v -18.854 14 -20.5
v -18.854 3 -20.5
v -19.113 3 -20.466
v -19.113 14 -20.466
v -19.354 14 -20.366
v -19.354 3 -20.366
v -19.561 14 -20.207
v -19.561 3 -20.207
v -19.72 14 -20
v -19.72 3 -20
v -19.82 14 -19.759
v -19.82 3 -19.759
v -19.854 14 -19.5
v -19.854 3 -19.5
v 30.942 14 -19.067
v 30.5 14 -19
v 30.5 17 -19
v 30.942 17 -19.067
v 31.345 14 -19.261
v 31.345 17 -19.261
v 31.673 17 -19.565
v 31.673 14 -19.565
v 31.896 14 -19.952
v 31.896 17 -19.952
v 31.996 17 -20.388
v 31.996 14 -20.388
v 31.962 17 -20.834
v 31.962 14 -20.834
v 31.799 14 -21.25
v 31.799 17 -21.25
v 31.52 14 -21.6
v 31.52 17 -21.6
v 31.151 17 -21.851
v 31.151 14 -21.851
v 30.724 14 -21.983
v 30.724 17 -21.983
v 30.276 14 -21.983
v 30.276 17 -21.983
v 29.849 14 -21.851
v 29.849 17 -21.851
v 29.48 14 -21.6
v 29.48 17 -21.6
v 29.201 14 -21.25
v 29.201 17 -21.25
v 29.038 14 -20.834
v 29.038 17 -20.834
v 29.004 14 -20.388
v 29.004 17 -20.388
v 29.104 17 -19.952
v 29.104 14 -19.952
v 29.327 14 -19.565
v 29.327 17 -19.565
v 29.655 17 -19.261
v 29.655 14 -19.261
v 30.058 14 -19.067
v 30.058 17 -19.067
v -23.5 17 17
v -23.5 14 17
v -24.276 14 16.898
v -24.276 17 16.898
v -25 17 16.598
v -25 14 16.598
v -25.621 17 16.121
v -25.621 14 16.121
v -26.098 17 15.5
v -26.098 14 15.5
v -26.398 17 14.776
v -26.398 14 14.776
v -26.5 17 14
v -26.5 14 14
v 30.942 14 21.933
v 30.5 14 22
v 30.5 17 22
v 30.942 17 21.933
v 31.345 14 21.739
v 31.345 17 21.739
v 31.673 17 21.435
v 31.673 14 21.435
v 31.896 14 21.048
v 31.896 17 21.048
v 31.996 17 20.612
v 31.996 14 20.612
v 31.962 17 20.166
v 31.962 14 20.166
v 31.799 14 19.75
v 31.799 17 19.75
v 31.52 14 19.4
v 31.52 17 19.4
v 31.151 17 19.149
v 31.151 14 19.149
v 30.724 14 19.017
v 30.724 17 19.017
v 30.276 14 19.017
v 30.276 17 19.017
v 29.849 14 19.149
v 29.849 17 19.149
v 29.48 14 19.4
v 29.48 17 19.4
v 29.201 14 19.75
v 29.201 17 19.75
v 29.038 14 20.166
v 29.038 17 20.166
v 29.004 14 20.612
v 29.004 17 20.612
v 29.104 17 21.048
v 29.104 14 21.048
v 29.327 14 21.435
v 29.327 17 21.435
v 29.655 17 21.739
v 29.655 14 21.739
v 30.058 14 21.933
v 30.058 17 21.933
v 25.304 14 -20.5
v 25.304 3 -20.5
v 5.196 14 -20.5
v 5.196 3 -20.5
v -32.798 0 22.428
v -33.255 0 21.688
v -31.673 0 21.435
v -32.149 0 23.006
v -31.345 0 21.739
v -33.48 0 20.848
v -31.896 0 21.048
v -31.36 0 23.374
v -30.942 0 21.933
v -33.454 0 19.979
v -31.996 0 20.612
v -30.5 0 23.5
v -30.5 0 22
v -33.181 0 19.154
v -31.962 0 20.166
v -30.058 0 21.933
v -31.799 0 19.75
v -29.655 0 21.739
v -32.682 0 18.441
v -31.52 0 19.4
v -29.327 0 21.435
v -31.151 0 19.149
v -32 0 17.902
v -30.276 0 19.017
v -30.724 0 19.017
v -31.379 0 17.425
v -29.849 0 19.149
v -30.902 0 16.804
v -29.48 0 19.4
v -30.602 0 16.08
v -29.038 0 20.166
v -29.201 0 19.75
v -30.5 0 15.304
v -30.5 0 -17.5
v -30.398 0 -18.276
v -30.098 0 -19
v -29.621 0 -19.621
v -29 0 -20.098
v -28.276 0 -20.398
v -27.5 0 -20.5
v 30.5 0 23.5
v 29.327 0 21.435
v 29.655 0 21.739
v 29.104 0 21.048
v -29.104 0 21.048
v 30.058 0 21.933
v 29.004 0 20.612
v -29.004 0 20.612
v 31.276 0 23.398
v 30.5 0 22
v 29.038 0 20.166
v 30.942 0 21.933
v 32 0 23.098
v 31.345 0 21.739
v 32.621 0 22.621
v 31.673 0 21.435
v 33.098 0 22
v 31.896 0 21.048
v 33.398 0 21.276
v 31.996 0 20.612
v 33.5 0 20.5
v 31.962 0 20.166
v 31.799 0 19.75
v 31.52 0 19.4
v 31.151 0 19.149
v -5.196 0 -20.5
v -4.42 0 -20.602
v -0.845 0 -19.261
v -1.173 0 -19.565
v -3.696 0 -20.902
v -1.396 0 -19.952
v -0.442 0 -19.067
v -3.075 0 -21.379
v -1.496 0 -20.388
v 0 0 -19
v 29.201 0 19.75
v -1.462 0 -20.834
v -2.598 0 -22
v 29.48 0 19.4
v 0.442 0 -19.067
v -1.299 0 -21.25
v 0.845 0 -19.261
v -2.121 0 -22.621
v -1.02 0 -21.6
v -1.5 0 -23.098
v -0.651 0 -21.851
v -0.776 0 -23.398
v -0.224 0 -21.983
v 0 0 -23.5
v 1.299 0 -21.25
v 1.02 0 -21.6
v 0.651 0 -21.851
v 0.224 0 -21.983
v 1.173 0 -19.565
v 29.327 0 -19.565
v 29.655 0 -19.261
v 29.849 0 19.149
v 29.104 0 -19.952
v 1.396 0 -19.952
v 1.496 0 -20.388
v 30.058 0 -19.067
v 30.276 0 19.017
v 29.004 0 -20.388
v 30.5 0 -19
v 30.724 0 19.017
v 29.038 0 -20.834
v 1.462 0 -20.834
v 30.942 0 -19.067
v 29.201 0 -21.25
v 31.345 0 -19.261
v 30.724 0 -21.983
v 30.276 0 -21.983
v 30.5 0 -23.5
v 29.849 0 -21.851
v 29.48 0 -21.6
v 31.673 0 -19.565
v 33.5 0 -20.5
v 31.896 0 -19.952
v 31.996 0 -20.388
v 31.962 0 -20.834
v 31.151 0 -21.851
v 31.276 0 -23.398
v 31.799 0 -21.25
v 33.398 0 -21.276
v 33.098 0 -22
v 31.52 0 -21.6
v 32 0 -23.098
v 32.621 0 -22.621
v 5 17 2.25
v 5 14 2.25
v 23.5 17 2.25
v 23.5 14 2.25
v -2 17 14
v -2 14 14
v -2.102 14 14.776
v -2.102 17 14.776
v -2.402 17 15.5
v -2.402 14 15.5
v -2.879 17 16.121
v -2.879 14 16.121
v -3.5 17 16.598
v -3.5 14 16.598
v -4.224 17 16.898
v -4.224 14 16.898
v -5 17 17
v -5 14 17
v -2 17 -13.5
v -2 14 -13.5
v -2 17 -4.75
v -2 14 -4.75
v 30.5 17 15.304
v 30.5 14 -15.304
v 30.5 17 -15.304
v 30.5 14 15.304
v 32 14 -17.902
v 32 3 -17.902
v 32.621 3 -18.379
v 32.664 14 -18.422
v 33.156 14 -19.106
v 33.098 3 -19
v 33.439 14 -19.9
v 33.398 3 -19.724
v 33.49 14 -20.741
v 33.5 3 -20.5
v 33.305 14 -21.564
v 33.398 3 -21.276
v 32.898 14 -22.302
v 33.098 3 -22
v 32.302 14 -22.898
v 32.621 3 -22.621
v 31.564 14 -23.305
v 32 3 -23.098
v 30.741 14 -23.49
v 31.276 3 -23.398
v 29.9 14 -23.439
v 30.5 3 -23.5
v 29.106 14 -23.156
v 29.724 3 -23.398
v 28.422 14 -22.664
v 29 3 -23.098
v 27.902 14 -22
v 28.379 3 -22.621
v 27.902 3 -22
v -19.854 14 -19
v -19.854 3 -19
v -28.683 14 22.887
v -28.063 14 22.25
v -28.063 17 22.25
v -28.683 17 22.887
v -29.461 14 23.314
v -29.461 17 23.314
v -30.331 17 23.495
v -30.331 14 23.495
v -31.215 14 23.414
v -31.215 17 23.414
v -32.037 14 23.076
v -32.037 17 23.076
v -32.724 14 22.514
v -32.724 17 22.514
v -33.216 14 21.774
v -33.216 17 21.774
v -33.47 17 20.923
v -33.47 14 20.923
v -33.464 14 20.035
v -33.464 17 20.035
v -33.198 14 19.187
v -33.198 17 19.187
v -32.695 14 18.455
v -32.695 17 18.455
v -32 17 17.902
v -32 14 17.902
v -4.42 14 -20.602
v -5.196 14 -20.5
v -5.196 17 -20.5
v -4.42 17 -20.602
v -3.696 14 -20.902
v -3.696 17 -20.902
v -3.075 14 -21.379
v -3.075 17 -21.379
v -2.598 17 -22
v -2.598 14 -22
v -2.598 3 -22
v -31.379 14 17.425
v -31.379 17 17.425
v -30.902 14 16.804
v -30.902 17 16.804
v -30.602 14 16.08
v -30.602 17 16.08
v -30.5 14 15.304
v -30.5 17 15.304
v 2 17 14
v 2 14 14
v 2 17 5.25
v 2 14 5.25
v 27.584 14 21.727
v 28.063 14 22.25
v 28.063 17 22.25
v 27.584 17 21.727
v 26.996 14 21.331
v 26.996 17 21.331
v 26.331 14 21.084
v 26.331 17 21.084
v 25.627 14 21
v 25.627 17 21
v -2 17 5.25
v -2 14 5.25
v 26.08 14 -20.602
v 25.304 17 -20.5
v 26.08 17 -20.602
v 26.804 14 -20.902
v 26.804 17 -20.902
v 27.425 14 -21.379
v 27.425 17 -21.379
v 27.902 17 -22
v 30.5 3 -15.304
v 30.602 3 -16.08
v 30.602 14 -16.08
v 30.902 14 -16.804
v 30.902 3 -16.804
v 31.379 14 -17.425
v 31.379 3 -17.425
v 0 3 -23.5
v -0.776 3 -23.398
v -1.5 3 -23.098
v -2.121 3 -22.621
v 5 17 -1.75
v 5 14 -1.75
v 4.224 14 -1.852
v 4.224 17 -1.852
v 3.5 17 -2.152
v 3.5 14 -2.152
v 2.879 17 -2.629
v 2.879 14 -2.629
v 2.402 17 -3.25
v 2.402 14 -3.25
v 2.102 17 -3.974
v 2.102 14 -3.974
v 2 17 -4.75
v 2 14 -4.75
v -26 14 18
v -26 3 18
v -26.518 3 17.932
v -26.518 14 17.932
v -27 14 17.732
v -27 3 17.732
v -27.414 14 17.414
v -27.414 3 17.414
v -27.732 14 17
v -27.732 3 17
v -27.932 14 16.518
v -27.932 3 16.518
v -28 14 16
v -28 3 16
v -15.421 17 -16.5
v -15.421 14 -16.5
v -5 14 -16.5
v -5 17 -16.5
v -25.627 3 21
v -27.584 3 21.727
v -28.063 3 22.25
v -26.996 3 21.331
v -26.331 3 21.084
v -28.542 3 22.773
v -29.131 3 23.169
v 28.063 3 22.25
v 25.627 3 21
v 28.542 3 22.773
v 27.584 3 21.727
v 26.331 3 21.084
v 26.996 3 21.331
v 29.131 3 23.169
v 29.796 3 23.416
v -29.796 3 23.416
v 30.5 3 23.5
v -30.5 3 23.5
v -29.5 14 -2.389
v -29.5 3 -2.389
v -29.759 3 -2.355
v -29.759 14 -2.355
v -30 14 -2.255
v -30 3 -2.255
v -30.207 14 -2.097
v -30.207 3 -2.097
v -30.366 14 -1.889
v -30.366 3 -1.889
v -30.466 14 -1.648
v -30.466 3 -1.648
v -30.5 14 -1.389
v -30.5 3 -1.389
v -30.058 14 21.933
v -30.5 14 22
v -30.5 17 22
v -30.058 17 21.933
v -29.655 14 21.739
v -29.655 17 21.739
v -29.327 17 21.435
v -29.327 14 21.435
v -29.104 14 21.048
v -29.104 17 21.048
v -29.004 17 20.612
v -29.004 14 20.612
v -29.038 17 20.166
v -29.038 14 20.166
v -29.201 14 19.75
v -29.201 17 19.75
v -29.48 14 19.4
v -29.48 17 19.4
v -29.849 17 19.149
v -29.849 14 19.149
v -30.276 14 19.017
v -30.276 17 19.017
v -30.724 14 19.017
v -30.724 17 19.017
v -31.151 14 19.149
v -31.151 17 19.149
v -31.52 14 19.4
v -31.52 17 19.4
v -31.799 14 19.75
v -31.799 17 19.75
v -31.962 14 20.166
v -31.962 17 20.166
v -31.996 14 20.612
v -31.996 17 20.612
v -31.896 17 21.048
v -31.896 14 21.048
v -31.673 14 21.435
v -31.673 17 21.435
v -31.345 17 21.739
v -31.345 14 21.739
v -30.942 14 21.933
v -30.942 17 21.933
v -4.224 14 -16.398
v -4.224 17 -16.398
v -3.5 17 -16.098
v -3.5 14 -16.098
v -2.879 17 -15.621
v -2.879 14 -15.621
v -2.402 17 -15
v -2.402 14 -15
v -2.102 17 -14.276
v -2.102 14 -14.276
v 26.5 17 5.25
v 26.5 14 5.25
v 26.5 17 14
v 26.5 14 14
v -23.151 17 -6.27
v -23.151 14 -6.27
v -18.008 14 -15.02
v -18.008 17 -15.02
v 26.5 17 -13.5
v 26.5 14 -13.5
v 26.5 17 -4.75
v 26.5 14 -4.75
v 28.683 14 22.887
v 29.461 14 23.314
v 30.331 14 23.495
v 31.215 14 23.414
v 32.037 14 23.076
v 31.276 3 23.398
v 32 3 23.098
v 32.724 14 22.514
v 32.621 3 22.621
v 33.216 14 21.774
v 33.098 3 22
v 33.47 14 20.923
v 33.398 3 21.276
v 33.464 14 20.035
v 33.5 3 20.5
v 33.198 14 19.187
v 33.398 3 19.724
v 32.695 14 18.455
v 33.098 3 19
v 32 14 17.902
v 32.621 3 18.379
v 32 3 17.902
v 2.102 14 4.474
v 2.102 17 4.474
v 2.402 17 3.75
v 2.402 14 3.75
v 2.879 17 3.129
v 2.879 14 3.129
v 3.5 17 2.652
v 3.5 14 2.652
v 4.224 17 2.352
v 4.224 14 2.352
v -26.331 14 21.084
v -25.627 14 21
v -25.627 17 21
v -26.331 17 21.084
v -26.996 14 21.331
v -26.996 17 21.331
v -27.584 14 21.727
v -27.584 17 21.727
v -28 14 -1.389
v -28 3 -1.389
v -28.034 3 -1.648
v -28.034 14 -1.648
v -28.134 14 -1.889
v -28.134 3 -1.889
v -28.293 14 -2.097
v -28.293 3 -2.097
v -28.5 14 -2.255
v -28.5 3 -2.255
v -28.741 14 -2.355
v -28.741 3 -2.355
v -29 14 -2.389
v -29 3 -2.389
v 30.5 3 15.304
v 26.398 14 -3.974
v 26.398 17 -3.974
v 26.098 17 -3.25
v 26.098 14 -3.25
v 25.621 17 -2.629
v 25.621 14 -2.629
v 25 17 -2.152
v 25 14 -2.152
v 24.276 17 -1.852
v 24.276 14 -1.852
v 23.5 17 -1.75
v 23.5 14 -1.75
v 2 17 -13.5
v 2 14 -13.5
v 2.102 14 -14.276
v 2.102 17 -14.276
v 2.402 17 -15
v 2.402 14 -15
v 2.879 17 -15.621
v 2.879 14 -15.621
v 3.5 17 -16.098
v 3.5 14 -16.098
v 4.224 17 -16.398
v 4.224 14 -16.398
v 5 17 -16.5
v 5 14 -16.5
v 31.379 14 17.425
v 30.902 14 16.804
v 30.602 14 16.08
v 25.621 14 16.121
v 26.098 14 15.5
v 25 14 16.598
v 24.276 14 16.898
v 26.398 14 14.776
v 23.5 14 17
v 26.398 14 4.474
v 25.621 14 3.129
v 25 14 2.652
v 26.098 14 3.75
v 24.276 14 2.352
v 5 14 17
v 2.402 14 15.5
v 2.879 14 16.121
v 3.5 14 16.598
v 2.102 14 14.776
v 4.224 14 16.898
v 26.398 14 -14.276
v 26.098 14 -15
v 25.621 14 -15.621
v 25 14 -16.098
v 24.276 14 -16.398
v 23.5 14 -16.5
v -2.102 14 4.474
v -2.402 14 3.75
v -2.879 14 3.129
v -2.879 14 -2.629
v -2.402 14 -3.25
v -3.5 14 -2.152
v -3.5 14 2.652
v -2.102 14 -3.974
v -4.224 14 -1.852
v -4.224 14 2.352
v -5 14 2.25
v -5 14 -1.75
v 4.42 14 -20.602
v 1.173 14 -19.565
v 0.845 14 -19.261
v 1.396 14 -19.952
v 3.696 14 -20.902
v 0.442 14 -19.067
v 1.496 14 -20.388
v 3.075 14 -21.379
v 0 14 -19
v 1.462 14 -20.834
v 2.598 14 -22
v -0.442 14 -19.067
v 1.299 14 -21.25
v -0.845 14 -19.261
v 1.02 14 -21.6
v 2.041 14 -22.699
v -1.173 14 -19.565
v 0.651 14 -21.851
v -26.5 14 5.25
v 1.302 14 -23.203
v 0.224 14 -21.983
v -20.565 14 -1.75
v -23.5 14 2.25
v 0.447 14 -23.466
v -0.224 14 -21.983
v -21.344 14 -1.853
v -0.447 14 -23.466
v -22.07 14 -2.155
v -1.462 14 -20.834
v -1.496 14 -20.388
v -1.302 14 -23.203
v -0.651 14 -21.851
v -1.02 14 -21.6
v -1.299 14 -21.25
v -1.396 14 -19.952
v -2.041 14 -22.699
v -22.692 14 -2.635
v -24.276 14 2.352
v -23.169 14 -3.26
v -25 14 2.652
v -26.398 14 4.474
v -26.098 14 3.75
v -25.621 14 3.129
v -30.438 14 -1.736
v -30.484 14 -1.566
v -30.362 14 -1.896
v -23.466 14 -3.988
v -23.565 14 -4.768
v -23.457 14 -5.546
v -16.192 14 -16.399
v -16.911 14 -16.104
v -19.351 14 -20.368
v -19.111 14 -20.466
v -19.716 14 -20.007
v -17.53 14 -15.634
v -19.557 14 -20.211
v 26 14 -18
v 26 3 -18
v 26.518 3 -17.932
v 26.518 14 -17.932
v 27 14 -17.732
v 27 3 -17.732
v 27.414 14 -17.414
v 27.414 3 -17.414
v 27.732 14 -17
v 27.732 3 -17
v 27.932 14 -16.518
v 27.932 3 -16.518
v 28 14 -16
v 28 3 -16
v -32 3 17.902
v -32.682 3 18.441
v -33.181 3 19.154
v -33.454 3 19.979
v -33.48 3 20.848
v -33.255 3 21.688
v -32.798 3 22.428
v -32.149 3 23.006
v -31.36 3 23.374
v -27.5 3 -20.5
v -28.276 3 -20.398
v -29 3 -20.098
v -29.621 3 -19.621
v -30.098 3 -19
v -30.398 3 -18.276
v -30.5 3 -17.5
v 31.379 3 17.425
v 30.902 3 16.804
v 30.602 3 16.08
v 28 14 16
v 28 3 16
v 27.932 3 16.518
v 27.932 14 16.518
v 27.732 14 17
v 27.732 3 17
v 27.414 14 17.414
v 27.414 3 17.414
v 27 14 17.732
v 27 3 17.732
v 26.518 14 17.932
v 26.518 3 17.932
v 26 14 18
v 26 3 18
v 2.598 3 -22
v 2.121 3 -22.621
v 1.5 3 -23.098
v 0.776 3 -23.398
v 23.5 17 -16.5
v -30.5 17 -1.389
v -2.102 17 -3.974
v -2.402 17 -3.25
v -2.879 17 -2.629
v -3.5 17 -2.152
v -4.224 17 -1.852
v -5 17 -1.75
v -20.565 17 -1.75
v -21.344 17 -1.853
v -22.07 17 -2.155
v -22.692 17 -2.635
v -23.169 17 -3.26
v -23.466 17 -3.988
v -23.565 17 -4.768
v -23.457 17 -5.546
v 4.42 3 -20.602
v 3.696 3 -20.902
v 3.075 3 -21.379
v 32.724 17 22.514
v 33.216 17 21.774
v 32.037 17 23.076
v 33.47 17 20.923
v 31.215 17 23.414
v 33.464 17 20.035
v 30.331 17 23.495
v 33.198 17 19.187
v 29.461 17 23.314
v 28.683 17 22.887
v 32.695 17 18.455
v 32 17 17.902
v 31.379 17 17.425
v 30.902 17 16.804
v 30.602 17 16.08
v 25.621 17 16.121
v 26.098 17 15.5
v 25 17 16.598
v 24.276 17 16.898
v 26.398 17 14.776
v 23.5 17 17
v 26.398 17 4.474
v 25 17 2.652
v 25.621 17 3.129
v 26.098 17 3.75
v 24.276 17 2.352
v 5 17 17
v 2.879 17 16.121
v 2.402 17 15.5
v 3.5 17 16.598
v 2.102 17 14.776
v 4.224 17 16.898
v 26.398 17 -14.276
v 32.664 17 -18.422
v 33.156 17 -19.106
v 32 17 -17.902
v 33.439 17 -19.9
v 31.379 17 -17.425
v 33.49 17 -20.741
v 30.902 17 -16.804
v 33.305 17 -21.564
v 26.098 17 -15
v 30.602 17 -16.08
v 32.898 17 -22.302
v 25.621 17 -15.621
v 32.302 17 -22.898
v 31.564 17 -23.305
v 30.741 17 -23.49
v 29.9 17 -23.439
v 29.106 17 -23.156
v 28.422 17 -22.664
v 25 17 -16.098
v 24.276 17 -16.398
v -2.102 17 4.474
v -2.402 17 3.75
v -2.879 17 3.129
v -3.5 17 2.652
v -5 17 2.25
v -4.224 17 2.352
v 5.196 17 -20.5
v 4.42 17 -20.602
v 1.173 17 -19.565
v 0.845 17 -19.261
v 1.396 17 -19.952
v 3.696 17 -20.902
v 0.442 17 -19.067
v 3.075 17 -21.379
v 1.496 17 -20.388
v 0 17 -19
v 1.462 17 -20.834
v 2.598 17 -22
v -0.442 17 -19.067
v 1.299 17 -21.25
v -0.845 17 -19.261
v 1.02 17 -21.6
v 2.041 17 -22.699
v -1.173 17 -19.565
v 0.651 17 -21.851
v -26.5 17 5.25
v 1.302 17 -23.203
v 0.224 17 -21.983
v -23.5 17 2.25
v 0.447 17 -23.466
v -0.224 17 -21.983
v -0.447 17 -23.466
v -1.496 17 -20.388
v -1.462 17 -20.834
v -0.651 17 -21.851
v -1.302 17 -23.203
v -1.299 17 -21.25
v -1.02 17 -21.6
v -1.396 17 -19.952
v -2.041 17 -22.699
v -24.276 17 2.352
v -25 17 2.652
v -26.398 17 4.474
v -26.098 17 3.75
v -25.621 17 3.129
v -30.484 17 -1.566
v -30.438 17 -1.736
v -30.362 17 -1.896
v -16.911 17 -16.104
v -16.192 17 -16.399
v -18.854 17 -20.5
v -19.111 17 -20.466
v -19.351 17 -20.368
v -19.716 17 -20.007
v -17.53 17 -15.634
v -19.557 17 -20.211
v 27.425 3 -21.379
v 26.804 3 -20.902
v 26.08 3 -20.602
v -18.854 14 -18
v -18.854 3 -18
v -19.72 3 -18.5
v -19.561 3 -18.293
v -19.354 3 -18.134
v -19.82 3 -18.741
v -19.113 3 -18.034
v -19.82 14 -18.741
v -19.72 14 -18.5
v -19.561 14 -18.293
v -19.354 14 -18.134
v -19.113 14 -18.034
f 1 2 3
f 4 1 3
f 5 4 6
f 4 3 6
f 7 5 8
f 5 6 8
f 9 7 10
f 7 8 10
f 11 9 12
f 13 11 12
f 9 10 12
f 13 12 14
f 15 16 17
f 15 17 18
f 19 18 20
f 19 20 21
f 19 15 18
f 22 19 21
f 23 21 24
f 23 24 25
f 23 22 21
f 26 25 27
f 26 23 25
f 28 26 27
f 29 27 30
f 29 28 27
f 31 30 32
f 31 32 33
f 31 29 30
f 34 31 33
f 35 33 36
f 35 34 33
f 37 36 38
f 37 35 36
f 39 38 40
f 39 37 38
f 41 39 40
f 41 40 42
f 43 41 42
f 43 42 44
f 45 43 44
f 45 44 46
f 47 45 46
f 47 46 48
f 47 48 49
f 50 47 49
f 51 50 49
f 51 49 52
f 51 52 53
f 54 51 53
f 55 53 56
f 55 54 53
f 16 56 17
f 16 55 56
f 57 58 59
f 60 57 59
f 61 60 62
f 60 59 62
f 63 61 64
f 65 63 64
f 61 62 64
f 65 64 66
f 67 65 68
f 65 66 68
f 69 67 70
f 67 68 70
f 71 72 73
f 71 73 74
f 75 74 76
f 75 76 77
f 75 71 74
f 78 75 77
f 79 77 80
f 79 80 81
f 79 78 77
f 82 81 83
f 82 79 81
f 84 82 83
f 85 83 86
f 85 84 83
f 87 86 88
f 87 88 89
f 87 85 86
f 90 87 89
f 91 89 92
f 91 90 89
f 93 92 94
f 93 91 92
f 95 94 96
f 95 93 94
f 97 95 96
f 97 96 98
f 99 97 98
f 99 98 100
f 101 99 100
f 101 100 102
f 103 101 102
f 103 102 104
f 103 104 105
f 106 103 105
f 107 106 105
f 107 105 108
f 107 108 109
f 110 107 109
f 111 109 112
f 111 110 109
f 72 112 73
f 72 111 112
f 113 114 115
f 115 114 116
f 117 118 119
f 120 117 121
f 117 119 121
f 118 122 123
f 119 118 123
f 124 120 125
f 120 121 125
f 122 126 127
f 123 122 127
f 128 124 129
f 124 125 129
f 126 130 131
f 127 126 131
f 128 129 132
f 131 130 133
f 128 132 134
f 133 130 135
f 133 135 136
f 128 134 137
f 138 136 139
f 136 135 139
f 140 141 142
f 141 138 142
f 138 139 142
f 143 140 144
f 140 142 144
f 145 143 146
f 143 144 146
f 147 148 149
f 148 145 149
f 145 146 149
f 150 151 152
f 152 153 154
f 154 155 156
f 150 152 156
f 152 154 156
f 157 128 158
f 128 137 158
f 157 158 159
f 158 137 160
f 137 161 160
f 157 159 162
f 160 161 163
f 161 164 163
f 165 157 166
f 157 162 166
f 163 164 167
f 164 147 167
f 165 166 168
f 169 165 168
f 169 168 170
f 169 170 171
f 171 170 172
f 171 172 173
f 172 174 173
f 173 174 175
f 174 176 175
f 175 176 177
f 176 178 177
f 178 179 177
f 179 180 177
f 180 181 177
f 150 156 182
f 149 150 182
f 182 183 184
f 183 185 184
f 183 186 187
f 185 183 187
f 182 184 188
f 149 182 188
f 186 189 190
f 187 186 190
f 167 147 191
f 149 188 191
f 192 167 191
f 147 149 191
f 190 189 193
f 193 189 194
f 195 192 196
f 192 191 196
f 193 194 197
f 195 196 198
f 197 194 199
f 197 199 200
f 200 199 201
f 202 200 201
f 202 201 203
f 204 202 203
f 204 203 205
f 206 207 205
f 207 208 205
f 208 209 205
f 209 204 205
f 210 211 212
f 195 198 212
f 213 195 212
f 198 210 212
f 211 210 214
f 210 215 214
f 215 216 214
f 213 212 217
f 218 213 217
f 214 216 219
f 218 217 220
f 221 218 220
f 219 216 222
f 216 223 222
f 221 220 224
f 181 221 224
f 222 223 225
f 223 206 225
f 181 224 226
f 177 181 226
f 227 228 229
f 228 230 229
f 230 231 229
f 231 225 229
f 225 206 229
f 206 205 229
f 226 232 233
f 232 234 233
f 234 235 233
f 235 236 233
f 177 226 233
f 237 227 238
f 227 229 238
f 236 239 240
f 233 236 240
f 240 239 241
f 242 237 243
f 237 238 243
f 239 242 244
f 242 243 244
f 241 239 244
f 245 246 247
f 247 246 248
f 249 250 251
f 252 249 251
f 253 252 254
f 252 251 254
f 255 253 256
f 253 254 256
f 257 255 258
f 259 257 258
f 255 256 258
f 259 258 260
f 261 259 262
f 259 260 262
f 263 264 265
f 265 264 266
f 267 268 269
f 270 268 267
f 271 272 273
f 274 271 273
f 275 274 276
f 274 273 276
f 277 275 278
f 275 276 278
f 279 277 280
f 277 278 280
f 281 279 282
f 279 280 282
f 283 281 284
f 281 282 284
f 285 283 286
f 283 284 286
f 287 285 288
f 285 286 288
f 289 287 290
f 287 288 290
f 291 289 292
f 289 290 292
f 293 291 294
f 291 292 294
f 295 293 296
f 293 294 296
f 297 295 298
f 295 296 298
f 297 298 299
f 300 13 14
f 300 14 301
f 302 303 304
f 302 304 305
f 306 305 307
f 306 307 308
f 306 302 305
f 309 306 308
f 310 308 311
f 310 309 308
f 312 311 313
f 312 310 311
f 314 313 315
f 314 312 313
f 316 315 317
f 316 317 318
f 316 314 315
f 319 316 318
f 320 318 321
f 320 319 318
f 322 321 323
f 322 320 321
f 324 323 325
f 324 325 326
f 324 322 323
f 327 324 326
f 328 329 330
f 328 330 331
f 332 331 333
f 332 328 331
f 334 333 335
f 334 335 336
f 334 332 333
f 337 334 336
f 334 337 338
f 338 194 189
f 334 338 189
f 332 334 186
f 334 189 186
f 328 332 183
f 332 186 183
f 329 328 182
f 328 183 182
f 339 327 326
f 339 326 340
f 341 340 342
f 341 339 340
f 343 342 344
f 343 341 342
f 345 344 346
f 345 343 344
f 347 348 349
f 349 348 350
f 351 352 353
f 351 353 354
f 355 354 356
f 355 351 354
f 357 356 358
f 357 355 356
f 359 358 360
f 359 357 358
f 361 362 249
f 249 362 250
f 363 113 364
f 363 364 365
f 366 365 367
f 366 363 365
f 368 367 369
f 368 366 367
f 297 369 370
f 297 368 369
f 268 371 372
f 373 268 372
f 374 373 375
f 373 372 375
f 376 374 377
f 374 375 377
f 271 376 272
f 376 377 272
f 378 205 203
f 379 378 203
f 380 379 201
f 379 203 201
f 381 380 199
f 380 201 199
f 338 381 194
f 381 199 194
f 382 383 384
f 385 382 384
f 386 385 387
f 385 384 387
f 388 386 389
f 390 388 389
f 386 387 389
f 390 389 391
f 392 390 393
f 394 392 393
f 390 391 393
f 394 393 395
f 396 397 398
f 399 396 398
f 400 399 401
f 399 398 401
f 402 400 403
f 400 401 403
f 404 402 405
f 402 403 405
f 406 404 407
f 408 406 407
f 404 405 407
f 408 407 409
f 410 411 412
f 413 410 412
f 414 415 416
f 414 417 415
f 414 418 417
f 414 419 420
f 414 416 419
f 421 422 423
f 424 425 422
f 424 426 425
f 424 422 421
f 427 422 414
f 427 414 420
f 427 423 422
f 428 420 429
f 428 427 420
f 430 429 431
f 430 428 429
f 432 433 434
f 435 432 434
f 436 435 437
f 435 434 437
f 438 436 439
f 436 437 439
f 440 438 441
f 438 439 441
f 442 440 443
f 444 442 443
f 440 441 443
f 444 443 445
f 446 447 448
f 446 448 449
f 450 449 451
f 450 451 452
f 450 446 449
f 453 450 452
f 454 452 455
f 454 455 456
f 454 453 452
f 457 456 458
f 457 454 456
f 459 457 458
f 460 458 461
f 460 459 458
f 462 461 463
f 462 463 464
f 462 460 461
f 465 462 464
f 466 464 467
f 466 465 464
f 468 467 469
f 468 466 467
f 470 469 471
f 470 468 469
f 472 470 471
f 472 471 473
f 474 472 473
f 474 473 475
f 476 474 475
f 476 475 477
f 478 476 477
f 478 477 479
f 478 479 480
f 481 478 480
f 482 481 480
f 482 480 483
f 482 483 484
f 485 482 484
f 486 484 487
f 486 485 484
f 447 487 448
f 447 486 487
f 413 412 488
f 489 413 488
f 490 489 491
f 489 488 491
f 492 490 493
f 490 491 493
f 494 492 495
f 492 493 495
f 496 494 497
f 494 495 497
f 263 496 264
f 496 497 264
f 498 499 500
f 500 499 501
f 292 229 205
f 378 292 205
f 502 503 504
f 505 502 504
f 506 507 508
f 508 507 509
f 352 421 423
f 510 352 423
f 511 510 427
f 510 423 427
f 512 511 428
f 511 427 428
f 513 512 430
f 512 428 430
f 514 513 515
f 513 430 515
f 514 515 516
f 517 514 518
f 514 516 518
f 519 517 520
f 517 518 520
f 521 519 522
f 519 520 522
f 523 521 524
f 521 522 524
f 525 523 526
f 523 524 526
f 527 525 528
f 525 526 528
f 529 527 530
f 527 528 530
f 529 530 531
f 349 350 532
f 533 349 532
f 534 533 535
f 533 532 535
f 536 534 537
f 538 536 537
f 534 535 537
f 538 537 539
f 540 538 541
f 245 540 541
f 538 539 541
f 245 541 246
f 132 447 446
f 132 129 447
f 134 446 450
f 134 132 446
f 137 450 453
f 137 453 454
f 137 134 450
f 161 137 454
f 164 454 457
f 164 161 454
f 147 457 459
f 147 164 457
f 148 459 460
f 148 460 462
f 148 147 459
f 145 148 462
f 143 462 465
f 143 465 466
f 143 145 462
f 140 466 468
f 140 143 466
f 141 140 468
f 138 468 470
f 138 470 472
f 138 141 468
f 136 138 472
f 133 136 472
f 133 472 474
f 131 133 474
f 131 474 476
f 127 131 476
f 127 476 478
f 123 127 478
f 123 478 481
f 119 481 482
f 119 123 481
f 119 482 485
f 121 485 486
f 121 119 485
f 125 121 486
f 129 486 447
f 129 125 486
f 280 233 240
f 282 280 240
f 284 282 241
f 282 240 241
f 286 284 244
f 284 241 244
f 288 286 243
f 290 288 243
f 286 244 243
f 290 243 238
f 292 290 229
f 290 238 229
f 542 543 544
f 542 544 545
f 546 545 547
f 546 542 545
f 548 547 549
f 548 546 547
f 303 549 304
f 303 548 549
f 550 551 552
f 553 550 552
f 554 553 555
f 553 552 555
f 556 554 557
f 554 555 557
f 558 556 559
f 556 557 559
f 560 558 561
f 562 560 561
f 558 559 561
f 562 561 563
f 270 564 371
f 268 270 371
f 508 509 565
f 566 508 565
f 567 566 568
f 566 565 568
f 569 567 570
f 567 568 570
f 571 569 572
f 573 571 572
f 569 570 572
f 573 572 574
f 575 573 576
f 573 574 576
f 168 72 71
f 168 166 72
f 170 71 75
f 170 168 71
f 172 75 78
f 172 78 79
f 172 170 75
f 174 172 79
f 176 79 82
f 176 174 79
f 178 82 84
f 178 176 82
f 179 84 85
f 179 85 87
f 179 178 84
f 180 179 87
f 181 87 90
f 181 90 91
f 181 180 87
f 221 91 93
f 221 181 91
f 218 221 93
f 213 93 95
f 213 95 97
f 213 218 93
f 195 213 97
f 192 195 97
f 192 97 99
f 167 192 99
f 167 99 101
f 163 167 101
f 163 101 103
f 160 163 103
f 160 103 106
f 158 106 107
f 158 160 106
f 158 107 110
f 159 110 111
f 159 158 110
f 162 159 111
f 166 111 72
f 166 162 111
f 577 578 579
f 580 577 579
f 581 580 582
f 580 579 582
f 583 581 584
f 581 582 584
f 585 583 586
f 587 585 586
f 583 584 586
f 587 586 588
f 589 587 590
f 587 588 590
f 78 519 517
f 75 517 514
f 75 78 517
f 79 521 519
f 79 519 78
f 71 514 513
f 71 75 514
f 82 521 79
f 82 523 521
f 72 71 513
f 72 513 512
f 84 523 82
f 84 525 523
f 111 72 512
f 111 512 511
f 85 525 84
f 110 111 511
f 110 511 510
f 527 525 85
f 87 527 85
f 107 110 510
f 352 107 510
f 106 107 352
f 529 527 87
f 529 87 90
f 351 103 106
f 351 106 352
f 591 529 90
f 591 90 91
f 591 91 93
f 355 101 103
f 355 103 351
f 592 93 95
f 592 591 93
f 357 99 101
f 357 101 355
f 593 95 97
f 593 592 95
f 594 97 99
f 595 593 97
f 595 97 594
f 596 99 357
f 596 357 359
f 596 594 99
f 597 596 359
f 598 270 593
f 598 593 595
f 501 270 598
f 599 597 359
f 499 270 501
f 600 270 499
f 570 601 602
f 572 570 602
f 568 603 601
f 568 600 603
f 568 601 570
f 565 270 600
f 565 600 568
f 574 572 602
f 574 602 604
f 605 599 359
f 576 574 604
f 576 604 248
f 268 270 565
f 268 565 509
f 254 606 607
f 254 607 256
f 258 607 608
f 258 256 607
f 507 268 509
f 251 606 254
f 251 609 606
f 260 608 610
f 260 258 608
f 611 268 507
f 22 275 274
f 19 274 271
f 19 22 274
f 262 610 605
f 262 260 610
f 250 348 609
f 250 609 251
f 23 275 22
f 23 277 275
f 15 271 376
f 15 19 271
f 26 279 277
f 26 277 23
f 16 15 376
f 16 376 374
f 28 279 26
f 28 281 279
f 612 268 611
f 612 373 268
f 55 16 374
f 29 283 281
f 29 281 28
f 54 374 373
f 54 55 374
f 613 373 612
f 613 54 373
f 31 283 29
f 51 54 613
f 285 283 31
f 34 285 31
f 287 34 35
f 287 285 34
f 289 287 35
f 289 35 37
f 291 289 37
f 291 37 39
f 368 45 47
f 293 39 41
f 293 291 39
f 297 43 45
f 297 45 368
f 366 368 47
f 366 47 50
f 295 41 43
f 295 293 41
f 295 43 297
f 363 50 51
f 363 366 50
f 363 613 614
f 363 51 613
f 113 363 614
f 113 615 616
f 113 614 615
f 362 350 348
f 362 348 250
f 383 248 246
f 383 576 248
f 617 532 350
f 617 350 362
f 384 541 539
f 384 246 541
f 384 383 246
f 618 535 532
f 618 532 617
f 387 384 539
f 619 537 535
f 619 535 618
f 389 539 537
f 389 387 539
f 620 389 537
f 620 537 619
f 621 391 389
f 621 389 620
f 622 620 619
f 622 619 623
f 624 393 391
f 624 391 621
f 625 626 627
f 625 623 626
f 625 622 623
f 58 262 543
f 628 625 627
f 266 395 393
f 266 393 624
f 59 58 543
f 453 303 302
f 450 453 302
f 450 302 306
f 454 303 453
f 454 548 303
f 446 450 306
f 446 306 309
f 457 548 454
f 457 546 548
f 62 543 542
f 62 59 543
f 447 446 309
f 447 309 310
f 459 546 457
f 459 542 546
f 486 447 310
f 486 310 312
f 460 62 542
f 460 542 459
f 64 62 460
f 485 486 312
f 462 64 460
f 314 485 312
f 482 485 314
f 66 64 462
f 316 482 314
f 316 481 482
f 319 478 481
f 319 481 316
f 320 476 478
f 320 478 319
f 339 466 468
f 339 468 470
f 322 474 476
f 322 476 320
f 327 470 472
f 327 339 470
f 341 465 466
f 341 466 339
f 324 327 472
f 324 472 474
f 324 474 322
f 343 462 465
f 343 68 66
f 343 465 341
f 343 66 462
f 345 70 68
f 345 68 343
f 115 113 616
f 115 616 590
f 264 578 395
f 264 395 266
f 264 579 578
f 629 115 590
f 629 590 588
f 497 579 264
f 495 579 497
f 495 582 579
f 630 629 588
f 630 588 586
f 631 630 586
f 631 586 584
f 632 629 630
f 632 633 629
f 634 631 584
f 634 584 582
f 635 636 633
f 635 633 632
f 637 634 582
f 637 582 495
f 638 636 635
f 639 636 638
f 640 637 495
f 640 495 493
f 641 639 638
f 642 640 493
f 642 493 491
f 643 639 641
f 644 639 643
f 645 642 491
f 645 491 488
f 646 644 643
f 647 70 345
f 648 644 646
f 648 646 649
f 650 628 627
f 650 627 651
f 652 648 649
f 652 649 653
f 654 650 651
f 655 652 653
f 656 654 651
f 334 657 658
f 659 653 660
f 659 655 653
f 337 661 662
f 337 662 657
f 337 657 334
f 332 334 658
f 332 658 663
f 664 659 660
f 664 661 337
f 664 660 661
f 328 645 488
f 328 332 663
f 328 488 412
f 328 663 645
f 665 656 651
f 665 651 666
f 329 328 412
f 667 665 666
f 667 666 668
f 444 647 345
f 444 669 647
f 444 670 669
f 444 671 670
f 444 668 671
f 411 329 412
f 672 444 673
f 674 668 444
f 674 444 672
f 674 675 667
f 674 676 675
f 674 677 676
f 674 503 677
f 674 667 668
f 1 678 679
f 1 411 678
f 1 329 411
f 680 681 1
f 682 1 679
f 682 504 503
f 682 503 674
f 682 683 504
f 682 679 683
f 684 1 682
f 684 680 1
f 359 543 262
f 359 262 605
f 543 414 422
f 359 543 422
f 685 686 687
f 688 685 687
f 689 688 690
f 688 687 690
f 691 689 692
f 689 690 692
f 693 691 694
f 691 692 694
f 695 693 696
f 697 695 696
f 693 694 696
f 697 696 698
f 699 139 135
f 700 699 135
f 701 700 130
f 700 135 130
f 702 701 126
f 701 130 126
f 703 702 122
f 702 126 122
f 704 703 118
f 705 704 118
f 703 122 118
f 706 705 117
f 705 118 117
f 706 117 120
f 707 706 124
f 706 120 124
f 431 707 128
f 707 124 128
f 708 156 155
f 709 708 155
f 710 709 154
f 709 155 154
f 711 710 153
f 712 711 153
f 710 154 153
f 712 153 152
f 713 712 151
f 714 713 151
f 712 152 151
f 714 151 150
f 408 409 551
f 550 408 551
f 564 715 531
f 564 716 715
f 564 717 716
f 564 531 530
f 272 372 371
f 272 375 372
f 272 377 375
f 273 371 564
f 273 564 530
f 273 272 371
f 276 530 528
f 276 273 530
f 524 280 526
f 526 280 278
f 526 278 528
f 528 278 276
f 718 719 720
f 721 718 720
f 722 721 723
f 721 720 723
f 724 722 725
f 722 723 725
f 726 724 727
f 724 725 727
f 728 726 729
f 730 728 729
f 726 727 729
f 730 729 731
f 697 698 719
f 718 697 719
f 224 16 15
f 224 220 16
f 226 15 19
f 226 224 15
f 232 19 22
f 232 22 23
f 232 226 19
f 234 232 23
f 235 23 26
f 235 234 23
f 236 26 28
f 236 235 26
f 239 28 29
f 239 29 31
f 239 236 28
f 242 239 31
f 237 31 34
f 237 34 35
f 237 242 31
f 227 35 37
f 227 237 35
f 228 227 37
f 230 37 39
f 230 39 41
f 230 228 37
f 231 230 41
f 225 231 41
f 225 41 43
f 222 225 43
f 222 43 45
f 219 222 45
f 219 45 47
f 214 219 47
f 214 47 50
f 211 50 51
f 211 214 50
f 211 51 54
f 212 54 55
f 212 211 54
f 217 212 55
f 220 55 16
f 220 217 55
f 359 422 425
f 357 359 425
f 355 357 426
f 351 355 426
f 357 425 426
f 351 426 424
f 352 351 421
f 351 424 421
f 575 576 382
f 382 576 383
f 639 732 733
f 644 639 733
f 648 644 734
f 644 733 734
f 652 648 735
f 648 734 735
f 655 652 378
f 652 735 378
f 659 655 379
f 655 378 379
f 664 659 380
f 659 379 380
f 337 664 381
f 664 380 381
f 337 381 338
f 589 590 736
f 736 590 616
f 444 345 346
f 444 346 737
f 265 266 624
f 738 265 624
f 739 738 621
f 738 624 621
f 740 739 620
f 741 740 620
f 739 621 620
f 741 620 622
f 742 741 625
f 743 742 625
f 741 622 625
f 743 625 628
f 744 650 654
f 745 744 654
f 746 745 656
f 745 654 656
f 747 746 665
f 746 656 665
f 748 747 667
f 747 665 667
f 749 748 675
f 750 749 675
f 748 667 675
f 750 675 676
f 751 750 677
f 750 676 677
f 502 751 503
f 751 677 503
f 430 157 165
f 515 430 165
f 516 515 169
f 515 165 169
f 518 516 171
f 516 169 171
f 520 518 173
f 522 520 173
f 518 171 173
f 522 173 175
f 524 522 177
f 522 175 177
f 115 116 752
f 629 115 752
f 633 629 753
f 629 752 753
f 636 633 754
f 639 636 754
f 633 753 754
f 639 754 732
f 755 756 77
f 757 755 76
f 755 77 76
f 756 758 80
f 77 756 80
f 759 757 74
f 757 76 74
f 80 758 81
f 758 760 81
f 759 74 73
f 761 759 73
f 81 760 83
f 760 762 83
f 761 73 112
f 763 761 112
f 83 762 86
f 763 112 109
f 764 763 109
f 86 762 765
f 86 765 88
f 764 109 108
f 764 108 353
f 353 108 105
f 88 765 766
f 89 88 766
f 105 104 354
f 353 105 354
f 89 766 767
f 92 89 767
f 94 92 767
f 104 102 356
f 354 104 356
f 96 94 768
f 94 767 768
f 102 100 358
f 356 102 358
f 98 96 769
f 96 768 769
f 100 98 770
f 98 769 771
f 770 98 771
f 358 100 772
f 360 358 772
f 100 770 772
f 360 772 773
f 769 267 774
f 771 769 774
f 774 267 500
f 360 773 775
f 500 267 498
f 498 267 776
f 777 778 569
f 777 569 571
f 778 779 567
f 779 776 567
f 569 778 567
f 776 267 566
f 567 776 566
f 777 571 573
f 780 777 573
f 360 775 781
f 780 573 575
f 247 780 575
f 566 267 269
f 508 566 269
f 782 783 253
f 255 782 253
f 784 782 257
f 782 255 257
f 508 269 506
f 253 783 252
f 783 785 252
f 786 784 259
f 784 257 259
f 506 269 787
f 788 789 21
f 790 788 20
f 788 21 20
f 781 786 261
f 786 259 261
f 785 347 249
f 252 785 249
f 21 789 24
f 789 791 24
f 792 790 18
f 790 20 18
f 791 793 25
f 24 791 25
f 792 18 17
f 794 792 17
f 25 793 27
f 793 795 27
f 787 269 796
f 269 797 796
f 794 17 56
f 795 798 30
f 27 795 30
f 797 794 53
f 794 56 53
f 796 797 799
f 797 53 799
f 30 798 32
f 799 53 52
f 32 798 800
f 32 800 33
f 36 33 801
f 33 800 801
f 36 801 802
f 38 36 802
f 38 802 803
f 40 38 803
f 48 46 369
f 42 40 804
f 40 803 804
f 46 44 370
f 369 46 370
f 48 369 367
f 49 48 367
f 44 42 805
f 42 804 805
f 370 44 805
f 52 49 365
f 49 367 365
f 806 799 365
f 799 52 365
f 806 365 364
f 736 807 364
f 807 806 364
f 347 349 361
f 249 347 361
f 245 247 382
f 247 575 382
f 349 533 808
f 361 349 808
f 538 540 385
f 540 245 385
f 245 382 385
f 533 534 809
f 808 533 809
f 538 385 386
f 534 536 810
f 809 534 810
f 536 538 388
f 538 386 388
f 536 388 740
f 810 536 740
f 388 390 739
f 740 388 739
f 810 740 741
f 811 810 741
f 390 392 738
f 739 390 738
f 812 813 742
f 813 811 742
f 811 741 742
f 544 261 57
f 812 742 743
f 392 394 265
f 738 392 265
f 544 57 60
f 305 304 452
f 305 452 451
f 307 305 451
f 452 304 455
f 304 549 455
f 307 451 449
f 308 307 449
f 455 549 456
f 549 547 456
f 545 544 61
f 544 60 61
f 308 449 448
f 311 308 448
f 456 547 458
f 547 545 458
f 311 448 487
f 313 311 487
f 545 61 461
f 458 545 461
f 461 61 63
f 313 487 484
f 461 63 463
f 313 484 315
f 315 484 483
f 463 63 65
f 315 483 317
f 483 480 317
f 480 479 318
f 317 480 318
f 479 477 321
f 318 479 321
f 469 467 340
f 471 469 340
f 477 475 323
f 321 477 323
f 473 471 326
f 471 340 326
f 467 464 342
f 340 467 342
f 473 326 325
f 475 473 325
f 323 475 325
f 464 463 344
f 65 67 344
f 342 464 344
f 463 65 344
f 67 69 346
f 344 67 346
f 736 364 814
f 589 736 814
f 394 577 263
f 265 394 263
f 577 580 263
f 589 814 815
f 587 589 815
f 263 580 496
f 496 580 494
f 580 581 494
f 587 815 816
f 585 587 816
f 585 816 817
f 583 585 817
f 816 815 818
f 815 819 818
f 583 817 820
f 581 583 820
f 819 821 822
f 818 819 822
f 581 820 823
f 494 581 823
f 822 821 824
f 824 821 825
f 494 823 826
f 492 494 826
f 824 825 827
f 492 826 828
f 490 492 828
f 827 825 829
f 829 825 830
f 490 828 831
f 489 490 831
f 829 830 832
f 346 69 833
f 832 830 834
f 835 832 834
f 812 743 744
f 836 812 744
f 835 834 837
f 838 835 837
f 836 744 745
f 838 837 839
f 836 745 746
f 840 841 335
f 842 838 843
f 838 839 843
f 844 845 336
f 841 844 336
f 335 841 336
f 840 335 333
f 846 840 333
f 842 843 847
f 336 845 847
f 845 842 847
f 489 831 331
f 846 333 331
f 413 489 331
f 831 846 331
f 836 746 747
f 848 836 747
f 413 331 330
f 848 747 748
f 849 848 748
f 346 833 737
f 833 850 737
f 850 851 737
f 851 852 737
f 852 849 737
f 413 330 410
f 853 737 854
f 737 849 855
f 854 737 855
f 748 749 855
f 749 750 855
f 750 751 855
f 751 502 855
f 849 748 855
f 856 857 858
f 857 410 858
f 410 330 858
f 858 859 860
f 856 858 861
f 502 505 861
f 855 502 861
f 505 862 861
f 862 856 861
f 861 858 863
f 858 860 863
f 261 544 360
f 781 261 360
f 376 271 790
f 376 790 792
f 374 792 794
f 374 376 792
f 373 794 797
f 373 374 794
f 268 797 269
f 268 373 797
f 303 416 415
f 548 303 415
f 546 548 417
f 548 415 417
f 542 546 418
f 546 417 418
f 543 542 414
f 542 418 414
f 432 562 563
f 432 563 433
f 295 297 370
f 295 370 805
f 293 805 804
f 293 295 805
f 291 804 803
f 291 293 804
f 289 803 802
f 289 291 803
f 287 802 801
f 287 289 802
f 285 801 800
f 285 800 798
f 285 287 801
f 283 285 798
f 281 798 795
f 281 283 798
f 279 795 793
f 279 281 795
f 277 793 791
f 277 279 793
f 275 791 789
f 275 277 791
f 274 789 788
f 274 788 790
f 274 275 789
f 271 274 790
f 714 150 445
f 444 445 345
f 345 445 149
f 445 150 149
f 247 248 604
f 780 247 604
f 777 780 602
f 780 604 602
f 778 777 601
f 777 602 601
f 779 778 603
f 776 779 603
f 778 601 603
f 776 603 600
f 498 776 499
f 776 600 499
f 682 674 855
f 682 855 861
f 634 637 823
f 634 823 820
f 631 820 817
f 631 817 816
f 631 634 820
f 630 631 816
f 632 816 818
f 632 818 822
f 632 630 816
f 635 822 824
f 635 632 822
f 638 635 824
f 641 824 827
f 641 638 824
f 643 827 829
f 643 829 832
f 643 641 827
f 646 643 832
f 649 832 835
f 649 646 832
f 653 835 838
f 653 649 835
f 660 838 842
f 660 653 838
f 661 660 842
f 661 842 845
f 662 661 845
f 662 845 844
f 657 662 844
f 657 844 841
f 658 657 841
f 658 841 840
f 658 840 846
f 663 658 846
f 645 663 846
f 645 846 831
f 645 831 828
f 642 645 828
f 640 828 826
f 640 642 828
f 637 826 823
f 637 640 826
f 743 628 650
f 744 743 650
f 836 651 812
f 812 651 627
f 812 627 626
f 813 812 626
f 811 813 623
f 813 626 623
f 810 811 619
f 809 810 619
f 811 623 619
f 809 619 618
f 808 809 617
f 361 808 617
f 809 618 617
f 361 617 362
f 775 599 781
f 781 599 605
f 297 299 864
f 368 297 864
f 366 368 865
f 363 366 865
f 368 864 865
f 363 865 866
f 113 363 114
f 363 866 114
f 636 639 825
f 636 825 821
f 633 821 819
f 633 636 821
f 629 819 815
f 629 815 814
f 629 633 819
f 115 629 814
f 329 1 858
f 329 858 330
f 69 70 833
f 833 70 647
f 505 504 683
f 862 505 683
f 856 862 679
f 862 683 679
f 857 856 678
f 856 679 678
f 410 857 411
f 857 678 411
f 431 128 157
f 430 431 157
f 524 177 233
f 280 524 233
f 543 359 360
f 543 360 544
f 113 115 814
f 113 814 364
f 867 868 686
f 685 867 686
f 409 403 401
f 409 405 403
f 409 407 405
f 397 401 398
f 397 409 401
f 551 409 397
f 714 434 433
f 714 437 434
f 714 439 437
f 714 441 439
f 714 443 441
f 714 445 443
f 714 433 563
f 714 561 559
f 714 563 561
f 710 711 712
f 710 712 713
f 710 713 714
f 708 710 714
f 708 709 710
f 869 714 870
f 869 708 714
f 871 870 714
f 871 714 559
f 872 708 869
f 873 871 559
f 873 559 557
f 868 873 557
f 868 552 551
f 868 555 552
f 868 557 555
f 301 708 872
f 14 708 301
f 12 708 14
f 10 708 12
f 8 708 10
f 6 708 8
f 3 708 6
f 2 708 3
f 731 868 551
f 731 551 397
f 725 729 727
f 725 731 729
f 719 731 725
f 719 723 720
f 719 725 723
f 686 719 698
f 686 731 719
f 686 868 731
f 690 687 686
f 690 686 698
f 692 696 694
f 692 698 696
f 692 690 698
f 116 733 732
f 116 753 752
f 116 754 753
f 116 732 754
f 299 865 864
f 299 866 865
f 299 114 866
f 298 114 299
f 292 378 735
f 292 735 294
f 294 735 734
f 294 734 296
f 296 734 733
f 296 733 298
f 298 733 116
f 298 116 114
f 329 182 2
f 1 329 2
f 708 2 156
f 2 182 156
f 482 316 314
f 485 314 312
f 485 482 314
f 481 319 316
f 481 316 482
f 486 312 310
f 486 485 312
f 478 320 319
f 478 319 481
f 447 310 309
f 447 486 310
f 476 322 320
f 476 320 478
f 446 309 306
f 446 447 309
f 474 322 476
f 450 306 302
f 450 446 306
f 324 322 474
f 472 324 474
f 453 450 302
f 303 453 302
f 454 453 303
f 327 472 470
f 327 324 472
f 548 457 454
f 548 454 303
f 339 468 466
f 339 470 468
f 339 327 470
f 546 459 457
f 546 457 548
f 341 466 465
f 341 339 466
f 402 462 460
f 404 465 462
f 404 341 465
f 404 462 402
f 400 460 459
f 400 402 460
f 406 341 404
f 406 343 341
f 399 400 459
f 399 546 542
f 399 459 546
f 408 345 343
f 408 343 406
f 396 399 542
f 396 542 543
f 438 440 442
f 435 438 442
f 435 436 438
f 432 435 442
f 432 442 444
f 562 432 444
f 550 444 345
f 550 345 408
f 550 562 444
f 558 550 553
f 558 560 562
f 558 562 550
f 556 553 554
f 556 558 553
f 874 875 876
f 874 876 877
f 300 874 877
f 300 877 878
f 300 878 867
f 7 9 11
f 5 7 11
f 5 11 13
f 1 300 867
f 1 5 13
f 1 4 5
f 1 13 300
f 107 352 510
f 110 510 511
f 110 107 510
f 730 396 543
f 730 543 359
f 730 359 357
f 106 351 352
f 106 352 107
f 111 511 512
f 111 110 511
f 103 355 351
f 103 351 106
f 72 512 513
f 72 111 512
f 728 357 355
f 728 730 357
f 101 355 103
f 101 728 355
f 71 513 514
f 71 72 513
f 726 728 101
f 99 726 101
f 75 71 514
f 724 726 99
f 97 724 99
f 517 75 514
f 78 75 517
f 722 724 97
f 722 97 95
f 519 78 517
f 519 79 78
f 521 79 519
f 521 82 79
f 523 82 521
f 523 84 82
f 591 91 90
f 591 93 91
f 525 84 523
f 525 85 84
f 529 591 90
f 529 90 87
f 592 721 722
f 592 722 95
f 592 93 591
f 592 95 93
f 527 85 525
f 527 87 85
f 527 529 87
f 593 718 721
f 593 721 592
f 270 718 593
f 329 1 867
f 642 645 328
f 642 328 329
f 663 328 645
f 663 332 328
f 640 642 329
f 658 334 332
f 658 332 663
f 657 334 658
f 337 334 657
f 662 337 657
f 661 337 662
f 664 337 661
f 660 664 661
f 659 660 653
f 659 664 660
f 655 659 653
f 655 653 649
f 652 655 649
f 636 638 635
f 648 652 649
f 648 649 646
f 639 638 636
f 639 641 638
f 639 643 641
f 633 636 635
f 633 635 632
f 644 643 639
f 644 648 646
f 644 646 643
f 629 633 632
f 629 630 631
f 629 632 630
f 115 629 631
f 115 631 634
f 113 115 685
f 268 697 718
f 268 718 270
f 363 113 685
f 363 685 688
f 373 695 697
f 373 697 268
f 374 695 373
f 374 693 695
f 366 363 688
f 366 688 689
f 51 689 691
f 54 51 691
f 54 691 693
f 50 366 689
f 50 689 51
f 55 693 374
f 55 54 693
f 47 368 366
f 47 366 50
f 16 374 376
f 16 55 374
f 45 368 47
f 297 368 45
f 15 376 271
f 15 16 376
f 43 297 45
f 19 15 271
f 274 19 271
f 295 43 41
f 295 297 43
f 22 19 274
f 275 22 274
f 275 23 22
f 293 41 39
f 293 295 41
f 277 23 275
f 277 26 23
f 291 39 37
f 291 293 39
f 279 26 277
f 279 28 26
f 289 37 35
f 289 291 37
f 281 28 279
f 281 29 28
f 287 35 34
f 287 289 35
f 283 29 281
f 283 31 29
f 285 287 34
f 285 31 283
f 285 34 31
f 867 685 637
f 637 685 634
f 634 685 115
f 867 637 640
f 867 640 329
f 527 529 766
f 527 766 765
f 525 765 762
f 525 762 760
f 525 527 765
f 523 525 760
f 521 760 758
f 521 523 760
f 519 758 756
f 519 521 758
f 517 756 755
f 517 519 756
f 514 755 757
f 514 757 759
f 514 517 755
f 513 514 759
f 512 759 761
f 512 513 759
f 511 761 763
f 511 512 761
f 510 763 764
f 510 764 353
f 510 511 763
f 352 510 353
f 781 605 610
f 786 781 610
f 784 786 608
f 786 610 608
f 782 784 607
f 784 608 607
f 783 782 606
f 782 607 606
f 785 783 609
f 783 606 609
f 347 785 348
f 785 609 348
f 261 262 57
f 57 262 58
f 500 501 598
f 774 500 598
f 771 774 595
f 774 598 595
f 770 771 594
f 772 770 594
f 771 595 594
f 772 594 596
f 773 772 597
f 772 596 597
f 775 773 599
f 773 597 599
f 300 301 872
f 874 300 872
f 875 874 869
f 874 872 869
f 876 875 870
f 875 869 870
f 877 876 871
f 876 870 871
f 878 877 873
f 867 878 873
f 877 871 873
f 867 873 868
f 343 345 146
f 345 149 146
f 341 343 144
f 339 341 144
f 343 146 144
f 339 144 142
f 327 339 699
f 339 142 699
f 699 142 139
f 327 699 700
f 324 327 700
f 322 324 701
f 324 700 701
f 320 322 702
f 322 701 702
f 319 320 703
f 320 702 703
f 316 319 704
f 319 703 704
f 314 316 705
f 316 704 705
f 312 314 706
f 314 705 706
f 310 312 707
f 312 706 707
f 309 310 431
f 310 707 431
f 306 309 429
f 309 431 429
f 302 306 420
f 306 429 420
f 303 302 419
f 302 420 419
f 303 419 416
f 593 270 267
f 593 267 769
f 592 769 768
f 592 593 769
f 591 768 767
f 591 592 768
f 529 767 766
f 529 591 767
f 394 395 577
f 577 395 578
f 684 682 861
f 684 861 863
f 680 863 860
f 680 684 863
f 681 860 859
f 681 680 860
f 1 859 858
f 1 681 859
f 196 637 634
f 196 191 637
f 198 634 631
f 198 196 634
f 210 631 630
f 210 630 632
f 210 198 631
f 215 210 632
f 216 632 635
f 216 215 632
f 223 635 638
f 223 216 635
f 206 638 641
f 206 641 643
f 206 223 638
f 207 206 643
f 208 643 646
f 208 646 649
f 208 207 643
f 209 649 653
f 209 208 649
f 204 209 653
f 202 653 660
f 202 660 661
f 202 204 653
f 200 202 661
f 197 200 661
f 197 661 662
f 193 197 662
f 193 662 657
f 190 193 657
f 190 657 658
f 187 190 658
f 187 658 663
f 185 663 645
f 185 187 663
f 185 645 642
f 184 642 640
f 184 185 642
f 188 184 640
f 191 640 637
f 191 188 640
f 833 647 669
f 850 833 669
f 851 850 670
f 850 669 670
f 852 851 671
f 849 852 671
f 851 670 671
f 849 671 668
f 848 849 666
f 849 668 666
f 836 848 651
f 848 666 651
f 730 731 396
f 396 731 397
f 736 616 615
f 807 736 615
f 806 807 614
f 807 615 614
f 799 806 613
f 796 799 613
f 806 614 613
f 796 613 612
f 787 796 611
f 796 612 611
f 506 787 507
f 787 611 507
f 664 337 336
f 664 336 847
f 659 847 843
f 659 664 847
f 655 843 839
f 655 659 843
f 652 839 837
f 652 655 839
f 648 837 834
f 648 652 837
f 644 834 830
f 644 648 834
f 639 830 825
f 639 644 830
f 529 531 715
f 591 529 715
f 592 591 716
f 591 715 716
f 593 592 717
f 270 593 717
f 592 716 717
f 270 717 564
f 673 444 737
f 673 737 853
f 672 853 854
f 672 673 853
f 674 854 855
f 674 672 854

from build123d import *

# Parameters (mm, degrees)
SKETCH5_R           = 1.5
BOSS_EXTRUDE2_DEPTH = 3
SKETCH6_R           = 1.5
BOSS_EXTRUDE3_DEPTH = 11
SKETCH7_R           = 1.5
BOSS_EXTRUDE4_DEPTH = 3


with BuildPart() as part:
    # Sketch5 → Boss-Extrude2 (new body)
    with BuildSketch(Plane(origin=(0, 0, 0), x_dir=(1, 0, 0), z_dir=(0, 1, 0))):
        with BuildLine():
            Line((-5.196152423, 20.5), (-27.5, 20.5))
            ThreePointArc((-27.5, 20.5), (-29.621320344, 19.621320344), (-30.5, 17.5))
            Line((-30.5, 17.5), (-30.5, -15.303847577))
            ThreePointArc((-30.5, -15.303847577), (-30.901923789, -16.803847577), (-32, -17.901923789))
            ThreePointArc((-32, -17.901923789), (-33.397777479, -21.276457135), (-30.5, -23.5))
            Line((-30.5, -23.5), (30.5, -23.5))
            ThreePointArc((30.5, -23.5), (32.621320344, -22.621320344), (33.5, -20.5))
            Line((33.5, -20.5), (33.5, 20.5))
            ThreePointArc((33.5, 20.5), (32.621320344, 22.621320344), (30.5, 23.5))
            Line((30.5, 23.5), (0, 23.5))
            ThreePointArc((0, 23.5), (-1.5, 23.098076211), (-2.598076211, 22))
            ThreePointArc((-2.598076211, 22), (-3.696152423, 20.901923789), (-5.196152423, 20.5))
        make_face()
        with Locations(Location((0, 20.5, 0), (0, 0, 270))):
            Circle(SKETCH5_R, mode=Mode.SUBTRACT)
        with Locations(Location((30.5, 20.5, 0), (0, 0, 270))):
            Circle(SKETCH5_R, mode=Mode.SUBTRACT)
        with Locations(Location((30.5, -20.5, 0), (0, 0, 270))):
            Circle(SKETCH5_R, mode=Mode.SUBTRACT)
        with Locations(Location((-30.5, -20.5, 0), (0, 0, 270))):
            Circle(SKETCH5_R, mode=Mode.SUBTRACT)
    extrude(amount=BOSS_EXTRUDE2_DEPTH)

    # Sketch6 → Boss-Extrude3 (add)
    with BuildSketch(Plane(origin=(0, 3, 0), x_dir=(1, 0, 0), z_dir=(0, 1, 0))):
        with BuildLine():
            Line((-30.5, 1.389438463), (-30.5, -15.303847577))
            ThreePointArc((-30.5, -15.303847577), (-30.901923789, -16.803847577), (-32, -17.901923789))
            ThreePointArc((-32, -17.901923789), (-32.723913835, -22.513506209), (-28.063301414, -22.25))
            ThreePointArc((-28.063301414, -22.25), (-26.995909221, -21.330730437), (-25.626602828, -21))
            Line((-25.626602828, -21), (25.626602828, -21))
            ThreePointArc((25.626602828, -21), (26.995909221, -21.330730437), (28.063301414, -22.25))
            ThreePointArc((28.063301414, -22.25), (32.723913835, -22.513506209), (32, -17.901923789))
            ThreePointArc((32, -17.901923789), (30.901923789, -16.803847577), (30.5, -15.303847577))
            Line((30.5, -15.303847577), (30.5, 15.303847577))
            ThreePointArc((30.5, 15.303847577), (30.901923789, 16.803847577), (32, 17.901923789))
            ThreePointArc((32, 17.901923789), (32.621320344, 22.621320344), (27.901923789, 22))
            ThreePointArc((27.901923789, 22), (26.803847577, 20.901923789), (25.303847577, 20.5))
            Line((25.303847577, 20.5), (5.196152423, 20.5))
            ThreePointArc((5.196152423, 20.5), (3.696152423, 20.901923789), (2.598076211, 22))
            ThreePointArc((2.598076211, 22), (0, 23.5), (-2.598076211, 22))
            ThreePointArc((-2.598076211, 22), (-3.696152423, 20.901923789), (-5.196152423, 20.5))
            Line((-5.196152423, 20.5), (-18.854157071, 20.5))
            ThreePointArc((-18.854157071, 20.5), (-19.561263852, 20.207106781), (-19.854157071, 19.5))
            Line((-19.854157071, 19.5), (-19.854157071, 19))
            ThreePointArc((-19.854157071, 19), (-19.561263852, 18.292893219), (-18.854157071, 18))
            Line((-18.854157071, 18), (26, 18))
            ThreePointArc((26, 18), (27.414213562, 17.414213562), (28, 16))
            Line((28, 16), (28, -16))
            ThreePointArc((28, -16), (27.414213562, -17.414213562), (26, -18))
            Line((26, -18), (-26, -18))
            ThreePointArc((-26, -18), (-27.414213562, -17.414213562), (-28, -16))
            Line((-28, -16), (-28, 1.389438463))
            ThreePointArc((-28, 1.389438463), (-28.292893219, 2.096545244), (-29, 2.389438463))
            Line((-29, 2.389438463), (-29.5, 2.389438463))
            ThreePointArc((-29.5, 2.389438463), (-30.207106781, 2.096545244), (-30.5, 1.389438463))
        make_face()
        with Locations(Location((0, 20.5, 0), (0, 0, 270))):
            Circle(SKETCH6_R, mode=Mode.SUBTRACT)
        with Locations(Location((30.5, 20.5, 0), (0, 0, 270))):
            Circle(SKETCH6_R, mode=Mode.SUBTRACT)
        with Locations(Location((30.5, -20.5, 0), (0, 0, 270))):
            Circle(SKETCH6_R, mode=Mode.SUBTRACT)
        with Locations(Location((-30.5, -20.5, 0), (0, 0, 270))):
            Circle(SKETCH6_R, mode=Mode.SUBTRACT)
    extrude(amount=BOSS_EXTRUDE3_DEPTH)


with BuildPart() as body_2:
    # Sketch7 → Boss-Extrude4 (new body)
    with BuildSketch(Plane(origin=(0, 14, 0), x_dir=(1, 0, 0), z_dir=(0, 1, 0))):
        with BuildLine():
            Line((-30.362088709, 1.896195858), (-19.71624578, 20.006757395))
            ThreePointArc((-19.71624578, 20.006757395), (-19.35076688, 20.367973904), (-18.854157071, 20.5))
            Line((-18.854157071, 20.5), (-5.196152423, 20.5))
            ThreePointArc((-5.196152423, 20.5), (-3.696152423, 20.901923789), (-2.598076211, 22))
            ThreePointArc((-2.598076211, 22), (0, 23.5), (2.598076211, 22))
            ThreePointArc((2.598076211, 22), (3.696152423, 20.901923789), (5.196152423, 20.5))
            Line((5.196152423, 20.5), (25.303847577, 20.5))
            ThreePointArc((25.303847577, 20.5), (26.803847577, 20.901923789), (27.901923789, 22))
            ThreePointArc((27.901923789, 22), (32.621320344, 22.621320344), (32, 17.901923789))
            ThreePointArc((32, 17.901923789), (30.901923789, 16.803847577), (30.5, 15.303847577))
            Line((30.5, 15.303847577), (30.5, -15.303847577))
            ThreePointArc((30.5, -15.303847577), (30.901923789, -16.803847577), (32, -17.901923789))
            ThreePointArc((32, -17.901923789), (32.723913835, -22.513506209), (28.063301414, -22.25))
            ThreePointArc((28.063301414, -22.25), (26.995909221, -21.330730437), (25.626602828, -21))
            Line((25.626602828, -21), (-25.626602828, -21))
            ThreePointArc((-25.626602828, -21), (-26.995909221, -21.330730437), (-28.063301414, -22.25))
            ThreePointArc((-28.063301414, -22.25), (-32.723913835, -22.513506209), (-32, -17.901923789))
            ThreePointArc((-32, -17.901923789), (-30.901923789, -16.803847577), (-30.5, -15.303847577))
            Line((-30.5, -15.303847577), (-30.5, 1.389438463))
            ThreePointArc((-30.5, 1.389438463), (-30.464906397, 1.652032532), (-30.362088709, 1.896195858))
        make_face()
        with Locations(Location((0, 20.5, 0), (0, 0, 270))):
            Circle(SKETCH7_R, mode=Mode.SUBTRACT)
        with Locations(Location((30.5, 20.5, 0), (0, 0, 270))):
            Circle(SKETCH7_R, mode=Mode.SUBTRACT)
        with Locations(Location((30.5, -20.5, 0), (0, 0, 270))):
            Circle(SKETCH7_R, mode=Mode.SUBTRACT)
        with Locations(Location((-30.5, -20.5, 0), (0, 0, 270))):
            Circle(SKETCH7_R, mode=Mode.SUBTRACT)
        with BuildLine():
            Line((-26.5, -14), (-26.5, -5.25))
            ThreePointArc((-26.5, -5.25), (-25.621320344, -3.128679656), (-23.5, -2.25))
            Line((-23.5, -2.25), (-5, -2.25))
            ThreePointArc((-5, -2.25), (-2.878679656, -3.128679656), (-2, -5.25))
            Line((-2, -5.25), (-2, -14))
            ThreePointArc((-2, -14), (-2.878679656, -16.121320344), (-5, -17))
            Line((-5, -17), (-23.5, -17))
            ThreePointArc((-23.5, -17), (-25.621320344, -16.121320344), (-26.5, -14))
        make_face(mode=Mode.SUBTRACT)
        with BuildLine():
            Line((-23.151003052, 6.270272185), (-18.007533291, 15.020272185))
            ThreePointArc((-18.007533291, 15.020272185), (-16.91109659, 16.103921711), (-15.421267163, 16.5))
            Line((-15.421267163, 16.5), (-5, 16.5))
            ThreePointArc((-5, 16.5), (-2.878679656, 15.621320344), (-2, 13.5))
            Line((-2, 13.5), (-2, 4.75))
            ThreePointArc((-2, 4.75), (-2.878679656, 2.628679656), (-5, 1.75))
            Line((-5, 1.75), (-20.564736925, 1.75))
            ThreePointArc((-20.564736925, 1.75), (-23.168658636, 3.260170573), (-23.151003052, 6.270272185))
        make_face(mode=Mode.SUBTRACT)
        with BuildLine():
            Line((26.5, 13.5), (26.5, 4.75))
            ThreePointArc((26.5, 4.75), (25.621320344, 2.628679656), (23.5, 1.75))
            Line((23.5, 1.75), (5, 1.75))
            ThreePointArc((5, 1.75), (2.878679656, 2.628679656), (2, 4.75))
            Line((2, 4.75), (2, 13.5))
            ThreePointArc((2, 13.5), (2.878679656, 15.621320344), (5, 16.5))
            Line((5, 16.5), (23.5, 16.5))
            ThreePointArc((23.5, 16.5), (25.621320344, 15.621320344), (26.5, 13.5))
        make_face(mode=Mode.SUBTRACT)
        with BuildLine():
            Line((23.5, -17), (5, -17))
            ThreePointArc((5, -17), (2.878679656, -16.121320344), (2, -14))
            Line((2, -14), (2, -5.25))
            ThreePointArc((2, -5.25), (2.878679656, -3.128679656), (5, -2.25))
            Line((5, -2.25), (23.5, -2.25))
            ThreePointArc((23.5, -2.25), (25.621320344, -3.128679656), (26.5, -5.25))
            Line((26.5, -5.25), (26.5, -14))
            ThreePointArc((26.5, -14), (25.621320344, -16.121320344), (23.5, -17))
        make_face(mode=Mode.SUBTRACT)
    extrude(amount=BOSS_EXTRUDE4_DEPTH)


solid = Compound([part.part, body_2.part])
